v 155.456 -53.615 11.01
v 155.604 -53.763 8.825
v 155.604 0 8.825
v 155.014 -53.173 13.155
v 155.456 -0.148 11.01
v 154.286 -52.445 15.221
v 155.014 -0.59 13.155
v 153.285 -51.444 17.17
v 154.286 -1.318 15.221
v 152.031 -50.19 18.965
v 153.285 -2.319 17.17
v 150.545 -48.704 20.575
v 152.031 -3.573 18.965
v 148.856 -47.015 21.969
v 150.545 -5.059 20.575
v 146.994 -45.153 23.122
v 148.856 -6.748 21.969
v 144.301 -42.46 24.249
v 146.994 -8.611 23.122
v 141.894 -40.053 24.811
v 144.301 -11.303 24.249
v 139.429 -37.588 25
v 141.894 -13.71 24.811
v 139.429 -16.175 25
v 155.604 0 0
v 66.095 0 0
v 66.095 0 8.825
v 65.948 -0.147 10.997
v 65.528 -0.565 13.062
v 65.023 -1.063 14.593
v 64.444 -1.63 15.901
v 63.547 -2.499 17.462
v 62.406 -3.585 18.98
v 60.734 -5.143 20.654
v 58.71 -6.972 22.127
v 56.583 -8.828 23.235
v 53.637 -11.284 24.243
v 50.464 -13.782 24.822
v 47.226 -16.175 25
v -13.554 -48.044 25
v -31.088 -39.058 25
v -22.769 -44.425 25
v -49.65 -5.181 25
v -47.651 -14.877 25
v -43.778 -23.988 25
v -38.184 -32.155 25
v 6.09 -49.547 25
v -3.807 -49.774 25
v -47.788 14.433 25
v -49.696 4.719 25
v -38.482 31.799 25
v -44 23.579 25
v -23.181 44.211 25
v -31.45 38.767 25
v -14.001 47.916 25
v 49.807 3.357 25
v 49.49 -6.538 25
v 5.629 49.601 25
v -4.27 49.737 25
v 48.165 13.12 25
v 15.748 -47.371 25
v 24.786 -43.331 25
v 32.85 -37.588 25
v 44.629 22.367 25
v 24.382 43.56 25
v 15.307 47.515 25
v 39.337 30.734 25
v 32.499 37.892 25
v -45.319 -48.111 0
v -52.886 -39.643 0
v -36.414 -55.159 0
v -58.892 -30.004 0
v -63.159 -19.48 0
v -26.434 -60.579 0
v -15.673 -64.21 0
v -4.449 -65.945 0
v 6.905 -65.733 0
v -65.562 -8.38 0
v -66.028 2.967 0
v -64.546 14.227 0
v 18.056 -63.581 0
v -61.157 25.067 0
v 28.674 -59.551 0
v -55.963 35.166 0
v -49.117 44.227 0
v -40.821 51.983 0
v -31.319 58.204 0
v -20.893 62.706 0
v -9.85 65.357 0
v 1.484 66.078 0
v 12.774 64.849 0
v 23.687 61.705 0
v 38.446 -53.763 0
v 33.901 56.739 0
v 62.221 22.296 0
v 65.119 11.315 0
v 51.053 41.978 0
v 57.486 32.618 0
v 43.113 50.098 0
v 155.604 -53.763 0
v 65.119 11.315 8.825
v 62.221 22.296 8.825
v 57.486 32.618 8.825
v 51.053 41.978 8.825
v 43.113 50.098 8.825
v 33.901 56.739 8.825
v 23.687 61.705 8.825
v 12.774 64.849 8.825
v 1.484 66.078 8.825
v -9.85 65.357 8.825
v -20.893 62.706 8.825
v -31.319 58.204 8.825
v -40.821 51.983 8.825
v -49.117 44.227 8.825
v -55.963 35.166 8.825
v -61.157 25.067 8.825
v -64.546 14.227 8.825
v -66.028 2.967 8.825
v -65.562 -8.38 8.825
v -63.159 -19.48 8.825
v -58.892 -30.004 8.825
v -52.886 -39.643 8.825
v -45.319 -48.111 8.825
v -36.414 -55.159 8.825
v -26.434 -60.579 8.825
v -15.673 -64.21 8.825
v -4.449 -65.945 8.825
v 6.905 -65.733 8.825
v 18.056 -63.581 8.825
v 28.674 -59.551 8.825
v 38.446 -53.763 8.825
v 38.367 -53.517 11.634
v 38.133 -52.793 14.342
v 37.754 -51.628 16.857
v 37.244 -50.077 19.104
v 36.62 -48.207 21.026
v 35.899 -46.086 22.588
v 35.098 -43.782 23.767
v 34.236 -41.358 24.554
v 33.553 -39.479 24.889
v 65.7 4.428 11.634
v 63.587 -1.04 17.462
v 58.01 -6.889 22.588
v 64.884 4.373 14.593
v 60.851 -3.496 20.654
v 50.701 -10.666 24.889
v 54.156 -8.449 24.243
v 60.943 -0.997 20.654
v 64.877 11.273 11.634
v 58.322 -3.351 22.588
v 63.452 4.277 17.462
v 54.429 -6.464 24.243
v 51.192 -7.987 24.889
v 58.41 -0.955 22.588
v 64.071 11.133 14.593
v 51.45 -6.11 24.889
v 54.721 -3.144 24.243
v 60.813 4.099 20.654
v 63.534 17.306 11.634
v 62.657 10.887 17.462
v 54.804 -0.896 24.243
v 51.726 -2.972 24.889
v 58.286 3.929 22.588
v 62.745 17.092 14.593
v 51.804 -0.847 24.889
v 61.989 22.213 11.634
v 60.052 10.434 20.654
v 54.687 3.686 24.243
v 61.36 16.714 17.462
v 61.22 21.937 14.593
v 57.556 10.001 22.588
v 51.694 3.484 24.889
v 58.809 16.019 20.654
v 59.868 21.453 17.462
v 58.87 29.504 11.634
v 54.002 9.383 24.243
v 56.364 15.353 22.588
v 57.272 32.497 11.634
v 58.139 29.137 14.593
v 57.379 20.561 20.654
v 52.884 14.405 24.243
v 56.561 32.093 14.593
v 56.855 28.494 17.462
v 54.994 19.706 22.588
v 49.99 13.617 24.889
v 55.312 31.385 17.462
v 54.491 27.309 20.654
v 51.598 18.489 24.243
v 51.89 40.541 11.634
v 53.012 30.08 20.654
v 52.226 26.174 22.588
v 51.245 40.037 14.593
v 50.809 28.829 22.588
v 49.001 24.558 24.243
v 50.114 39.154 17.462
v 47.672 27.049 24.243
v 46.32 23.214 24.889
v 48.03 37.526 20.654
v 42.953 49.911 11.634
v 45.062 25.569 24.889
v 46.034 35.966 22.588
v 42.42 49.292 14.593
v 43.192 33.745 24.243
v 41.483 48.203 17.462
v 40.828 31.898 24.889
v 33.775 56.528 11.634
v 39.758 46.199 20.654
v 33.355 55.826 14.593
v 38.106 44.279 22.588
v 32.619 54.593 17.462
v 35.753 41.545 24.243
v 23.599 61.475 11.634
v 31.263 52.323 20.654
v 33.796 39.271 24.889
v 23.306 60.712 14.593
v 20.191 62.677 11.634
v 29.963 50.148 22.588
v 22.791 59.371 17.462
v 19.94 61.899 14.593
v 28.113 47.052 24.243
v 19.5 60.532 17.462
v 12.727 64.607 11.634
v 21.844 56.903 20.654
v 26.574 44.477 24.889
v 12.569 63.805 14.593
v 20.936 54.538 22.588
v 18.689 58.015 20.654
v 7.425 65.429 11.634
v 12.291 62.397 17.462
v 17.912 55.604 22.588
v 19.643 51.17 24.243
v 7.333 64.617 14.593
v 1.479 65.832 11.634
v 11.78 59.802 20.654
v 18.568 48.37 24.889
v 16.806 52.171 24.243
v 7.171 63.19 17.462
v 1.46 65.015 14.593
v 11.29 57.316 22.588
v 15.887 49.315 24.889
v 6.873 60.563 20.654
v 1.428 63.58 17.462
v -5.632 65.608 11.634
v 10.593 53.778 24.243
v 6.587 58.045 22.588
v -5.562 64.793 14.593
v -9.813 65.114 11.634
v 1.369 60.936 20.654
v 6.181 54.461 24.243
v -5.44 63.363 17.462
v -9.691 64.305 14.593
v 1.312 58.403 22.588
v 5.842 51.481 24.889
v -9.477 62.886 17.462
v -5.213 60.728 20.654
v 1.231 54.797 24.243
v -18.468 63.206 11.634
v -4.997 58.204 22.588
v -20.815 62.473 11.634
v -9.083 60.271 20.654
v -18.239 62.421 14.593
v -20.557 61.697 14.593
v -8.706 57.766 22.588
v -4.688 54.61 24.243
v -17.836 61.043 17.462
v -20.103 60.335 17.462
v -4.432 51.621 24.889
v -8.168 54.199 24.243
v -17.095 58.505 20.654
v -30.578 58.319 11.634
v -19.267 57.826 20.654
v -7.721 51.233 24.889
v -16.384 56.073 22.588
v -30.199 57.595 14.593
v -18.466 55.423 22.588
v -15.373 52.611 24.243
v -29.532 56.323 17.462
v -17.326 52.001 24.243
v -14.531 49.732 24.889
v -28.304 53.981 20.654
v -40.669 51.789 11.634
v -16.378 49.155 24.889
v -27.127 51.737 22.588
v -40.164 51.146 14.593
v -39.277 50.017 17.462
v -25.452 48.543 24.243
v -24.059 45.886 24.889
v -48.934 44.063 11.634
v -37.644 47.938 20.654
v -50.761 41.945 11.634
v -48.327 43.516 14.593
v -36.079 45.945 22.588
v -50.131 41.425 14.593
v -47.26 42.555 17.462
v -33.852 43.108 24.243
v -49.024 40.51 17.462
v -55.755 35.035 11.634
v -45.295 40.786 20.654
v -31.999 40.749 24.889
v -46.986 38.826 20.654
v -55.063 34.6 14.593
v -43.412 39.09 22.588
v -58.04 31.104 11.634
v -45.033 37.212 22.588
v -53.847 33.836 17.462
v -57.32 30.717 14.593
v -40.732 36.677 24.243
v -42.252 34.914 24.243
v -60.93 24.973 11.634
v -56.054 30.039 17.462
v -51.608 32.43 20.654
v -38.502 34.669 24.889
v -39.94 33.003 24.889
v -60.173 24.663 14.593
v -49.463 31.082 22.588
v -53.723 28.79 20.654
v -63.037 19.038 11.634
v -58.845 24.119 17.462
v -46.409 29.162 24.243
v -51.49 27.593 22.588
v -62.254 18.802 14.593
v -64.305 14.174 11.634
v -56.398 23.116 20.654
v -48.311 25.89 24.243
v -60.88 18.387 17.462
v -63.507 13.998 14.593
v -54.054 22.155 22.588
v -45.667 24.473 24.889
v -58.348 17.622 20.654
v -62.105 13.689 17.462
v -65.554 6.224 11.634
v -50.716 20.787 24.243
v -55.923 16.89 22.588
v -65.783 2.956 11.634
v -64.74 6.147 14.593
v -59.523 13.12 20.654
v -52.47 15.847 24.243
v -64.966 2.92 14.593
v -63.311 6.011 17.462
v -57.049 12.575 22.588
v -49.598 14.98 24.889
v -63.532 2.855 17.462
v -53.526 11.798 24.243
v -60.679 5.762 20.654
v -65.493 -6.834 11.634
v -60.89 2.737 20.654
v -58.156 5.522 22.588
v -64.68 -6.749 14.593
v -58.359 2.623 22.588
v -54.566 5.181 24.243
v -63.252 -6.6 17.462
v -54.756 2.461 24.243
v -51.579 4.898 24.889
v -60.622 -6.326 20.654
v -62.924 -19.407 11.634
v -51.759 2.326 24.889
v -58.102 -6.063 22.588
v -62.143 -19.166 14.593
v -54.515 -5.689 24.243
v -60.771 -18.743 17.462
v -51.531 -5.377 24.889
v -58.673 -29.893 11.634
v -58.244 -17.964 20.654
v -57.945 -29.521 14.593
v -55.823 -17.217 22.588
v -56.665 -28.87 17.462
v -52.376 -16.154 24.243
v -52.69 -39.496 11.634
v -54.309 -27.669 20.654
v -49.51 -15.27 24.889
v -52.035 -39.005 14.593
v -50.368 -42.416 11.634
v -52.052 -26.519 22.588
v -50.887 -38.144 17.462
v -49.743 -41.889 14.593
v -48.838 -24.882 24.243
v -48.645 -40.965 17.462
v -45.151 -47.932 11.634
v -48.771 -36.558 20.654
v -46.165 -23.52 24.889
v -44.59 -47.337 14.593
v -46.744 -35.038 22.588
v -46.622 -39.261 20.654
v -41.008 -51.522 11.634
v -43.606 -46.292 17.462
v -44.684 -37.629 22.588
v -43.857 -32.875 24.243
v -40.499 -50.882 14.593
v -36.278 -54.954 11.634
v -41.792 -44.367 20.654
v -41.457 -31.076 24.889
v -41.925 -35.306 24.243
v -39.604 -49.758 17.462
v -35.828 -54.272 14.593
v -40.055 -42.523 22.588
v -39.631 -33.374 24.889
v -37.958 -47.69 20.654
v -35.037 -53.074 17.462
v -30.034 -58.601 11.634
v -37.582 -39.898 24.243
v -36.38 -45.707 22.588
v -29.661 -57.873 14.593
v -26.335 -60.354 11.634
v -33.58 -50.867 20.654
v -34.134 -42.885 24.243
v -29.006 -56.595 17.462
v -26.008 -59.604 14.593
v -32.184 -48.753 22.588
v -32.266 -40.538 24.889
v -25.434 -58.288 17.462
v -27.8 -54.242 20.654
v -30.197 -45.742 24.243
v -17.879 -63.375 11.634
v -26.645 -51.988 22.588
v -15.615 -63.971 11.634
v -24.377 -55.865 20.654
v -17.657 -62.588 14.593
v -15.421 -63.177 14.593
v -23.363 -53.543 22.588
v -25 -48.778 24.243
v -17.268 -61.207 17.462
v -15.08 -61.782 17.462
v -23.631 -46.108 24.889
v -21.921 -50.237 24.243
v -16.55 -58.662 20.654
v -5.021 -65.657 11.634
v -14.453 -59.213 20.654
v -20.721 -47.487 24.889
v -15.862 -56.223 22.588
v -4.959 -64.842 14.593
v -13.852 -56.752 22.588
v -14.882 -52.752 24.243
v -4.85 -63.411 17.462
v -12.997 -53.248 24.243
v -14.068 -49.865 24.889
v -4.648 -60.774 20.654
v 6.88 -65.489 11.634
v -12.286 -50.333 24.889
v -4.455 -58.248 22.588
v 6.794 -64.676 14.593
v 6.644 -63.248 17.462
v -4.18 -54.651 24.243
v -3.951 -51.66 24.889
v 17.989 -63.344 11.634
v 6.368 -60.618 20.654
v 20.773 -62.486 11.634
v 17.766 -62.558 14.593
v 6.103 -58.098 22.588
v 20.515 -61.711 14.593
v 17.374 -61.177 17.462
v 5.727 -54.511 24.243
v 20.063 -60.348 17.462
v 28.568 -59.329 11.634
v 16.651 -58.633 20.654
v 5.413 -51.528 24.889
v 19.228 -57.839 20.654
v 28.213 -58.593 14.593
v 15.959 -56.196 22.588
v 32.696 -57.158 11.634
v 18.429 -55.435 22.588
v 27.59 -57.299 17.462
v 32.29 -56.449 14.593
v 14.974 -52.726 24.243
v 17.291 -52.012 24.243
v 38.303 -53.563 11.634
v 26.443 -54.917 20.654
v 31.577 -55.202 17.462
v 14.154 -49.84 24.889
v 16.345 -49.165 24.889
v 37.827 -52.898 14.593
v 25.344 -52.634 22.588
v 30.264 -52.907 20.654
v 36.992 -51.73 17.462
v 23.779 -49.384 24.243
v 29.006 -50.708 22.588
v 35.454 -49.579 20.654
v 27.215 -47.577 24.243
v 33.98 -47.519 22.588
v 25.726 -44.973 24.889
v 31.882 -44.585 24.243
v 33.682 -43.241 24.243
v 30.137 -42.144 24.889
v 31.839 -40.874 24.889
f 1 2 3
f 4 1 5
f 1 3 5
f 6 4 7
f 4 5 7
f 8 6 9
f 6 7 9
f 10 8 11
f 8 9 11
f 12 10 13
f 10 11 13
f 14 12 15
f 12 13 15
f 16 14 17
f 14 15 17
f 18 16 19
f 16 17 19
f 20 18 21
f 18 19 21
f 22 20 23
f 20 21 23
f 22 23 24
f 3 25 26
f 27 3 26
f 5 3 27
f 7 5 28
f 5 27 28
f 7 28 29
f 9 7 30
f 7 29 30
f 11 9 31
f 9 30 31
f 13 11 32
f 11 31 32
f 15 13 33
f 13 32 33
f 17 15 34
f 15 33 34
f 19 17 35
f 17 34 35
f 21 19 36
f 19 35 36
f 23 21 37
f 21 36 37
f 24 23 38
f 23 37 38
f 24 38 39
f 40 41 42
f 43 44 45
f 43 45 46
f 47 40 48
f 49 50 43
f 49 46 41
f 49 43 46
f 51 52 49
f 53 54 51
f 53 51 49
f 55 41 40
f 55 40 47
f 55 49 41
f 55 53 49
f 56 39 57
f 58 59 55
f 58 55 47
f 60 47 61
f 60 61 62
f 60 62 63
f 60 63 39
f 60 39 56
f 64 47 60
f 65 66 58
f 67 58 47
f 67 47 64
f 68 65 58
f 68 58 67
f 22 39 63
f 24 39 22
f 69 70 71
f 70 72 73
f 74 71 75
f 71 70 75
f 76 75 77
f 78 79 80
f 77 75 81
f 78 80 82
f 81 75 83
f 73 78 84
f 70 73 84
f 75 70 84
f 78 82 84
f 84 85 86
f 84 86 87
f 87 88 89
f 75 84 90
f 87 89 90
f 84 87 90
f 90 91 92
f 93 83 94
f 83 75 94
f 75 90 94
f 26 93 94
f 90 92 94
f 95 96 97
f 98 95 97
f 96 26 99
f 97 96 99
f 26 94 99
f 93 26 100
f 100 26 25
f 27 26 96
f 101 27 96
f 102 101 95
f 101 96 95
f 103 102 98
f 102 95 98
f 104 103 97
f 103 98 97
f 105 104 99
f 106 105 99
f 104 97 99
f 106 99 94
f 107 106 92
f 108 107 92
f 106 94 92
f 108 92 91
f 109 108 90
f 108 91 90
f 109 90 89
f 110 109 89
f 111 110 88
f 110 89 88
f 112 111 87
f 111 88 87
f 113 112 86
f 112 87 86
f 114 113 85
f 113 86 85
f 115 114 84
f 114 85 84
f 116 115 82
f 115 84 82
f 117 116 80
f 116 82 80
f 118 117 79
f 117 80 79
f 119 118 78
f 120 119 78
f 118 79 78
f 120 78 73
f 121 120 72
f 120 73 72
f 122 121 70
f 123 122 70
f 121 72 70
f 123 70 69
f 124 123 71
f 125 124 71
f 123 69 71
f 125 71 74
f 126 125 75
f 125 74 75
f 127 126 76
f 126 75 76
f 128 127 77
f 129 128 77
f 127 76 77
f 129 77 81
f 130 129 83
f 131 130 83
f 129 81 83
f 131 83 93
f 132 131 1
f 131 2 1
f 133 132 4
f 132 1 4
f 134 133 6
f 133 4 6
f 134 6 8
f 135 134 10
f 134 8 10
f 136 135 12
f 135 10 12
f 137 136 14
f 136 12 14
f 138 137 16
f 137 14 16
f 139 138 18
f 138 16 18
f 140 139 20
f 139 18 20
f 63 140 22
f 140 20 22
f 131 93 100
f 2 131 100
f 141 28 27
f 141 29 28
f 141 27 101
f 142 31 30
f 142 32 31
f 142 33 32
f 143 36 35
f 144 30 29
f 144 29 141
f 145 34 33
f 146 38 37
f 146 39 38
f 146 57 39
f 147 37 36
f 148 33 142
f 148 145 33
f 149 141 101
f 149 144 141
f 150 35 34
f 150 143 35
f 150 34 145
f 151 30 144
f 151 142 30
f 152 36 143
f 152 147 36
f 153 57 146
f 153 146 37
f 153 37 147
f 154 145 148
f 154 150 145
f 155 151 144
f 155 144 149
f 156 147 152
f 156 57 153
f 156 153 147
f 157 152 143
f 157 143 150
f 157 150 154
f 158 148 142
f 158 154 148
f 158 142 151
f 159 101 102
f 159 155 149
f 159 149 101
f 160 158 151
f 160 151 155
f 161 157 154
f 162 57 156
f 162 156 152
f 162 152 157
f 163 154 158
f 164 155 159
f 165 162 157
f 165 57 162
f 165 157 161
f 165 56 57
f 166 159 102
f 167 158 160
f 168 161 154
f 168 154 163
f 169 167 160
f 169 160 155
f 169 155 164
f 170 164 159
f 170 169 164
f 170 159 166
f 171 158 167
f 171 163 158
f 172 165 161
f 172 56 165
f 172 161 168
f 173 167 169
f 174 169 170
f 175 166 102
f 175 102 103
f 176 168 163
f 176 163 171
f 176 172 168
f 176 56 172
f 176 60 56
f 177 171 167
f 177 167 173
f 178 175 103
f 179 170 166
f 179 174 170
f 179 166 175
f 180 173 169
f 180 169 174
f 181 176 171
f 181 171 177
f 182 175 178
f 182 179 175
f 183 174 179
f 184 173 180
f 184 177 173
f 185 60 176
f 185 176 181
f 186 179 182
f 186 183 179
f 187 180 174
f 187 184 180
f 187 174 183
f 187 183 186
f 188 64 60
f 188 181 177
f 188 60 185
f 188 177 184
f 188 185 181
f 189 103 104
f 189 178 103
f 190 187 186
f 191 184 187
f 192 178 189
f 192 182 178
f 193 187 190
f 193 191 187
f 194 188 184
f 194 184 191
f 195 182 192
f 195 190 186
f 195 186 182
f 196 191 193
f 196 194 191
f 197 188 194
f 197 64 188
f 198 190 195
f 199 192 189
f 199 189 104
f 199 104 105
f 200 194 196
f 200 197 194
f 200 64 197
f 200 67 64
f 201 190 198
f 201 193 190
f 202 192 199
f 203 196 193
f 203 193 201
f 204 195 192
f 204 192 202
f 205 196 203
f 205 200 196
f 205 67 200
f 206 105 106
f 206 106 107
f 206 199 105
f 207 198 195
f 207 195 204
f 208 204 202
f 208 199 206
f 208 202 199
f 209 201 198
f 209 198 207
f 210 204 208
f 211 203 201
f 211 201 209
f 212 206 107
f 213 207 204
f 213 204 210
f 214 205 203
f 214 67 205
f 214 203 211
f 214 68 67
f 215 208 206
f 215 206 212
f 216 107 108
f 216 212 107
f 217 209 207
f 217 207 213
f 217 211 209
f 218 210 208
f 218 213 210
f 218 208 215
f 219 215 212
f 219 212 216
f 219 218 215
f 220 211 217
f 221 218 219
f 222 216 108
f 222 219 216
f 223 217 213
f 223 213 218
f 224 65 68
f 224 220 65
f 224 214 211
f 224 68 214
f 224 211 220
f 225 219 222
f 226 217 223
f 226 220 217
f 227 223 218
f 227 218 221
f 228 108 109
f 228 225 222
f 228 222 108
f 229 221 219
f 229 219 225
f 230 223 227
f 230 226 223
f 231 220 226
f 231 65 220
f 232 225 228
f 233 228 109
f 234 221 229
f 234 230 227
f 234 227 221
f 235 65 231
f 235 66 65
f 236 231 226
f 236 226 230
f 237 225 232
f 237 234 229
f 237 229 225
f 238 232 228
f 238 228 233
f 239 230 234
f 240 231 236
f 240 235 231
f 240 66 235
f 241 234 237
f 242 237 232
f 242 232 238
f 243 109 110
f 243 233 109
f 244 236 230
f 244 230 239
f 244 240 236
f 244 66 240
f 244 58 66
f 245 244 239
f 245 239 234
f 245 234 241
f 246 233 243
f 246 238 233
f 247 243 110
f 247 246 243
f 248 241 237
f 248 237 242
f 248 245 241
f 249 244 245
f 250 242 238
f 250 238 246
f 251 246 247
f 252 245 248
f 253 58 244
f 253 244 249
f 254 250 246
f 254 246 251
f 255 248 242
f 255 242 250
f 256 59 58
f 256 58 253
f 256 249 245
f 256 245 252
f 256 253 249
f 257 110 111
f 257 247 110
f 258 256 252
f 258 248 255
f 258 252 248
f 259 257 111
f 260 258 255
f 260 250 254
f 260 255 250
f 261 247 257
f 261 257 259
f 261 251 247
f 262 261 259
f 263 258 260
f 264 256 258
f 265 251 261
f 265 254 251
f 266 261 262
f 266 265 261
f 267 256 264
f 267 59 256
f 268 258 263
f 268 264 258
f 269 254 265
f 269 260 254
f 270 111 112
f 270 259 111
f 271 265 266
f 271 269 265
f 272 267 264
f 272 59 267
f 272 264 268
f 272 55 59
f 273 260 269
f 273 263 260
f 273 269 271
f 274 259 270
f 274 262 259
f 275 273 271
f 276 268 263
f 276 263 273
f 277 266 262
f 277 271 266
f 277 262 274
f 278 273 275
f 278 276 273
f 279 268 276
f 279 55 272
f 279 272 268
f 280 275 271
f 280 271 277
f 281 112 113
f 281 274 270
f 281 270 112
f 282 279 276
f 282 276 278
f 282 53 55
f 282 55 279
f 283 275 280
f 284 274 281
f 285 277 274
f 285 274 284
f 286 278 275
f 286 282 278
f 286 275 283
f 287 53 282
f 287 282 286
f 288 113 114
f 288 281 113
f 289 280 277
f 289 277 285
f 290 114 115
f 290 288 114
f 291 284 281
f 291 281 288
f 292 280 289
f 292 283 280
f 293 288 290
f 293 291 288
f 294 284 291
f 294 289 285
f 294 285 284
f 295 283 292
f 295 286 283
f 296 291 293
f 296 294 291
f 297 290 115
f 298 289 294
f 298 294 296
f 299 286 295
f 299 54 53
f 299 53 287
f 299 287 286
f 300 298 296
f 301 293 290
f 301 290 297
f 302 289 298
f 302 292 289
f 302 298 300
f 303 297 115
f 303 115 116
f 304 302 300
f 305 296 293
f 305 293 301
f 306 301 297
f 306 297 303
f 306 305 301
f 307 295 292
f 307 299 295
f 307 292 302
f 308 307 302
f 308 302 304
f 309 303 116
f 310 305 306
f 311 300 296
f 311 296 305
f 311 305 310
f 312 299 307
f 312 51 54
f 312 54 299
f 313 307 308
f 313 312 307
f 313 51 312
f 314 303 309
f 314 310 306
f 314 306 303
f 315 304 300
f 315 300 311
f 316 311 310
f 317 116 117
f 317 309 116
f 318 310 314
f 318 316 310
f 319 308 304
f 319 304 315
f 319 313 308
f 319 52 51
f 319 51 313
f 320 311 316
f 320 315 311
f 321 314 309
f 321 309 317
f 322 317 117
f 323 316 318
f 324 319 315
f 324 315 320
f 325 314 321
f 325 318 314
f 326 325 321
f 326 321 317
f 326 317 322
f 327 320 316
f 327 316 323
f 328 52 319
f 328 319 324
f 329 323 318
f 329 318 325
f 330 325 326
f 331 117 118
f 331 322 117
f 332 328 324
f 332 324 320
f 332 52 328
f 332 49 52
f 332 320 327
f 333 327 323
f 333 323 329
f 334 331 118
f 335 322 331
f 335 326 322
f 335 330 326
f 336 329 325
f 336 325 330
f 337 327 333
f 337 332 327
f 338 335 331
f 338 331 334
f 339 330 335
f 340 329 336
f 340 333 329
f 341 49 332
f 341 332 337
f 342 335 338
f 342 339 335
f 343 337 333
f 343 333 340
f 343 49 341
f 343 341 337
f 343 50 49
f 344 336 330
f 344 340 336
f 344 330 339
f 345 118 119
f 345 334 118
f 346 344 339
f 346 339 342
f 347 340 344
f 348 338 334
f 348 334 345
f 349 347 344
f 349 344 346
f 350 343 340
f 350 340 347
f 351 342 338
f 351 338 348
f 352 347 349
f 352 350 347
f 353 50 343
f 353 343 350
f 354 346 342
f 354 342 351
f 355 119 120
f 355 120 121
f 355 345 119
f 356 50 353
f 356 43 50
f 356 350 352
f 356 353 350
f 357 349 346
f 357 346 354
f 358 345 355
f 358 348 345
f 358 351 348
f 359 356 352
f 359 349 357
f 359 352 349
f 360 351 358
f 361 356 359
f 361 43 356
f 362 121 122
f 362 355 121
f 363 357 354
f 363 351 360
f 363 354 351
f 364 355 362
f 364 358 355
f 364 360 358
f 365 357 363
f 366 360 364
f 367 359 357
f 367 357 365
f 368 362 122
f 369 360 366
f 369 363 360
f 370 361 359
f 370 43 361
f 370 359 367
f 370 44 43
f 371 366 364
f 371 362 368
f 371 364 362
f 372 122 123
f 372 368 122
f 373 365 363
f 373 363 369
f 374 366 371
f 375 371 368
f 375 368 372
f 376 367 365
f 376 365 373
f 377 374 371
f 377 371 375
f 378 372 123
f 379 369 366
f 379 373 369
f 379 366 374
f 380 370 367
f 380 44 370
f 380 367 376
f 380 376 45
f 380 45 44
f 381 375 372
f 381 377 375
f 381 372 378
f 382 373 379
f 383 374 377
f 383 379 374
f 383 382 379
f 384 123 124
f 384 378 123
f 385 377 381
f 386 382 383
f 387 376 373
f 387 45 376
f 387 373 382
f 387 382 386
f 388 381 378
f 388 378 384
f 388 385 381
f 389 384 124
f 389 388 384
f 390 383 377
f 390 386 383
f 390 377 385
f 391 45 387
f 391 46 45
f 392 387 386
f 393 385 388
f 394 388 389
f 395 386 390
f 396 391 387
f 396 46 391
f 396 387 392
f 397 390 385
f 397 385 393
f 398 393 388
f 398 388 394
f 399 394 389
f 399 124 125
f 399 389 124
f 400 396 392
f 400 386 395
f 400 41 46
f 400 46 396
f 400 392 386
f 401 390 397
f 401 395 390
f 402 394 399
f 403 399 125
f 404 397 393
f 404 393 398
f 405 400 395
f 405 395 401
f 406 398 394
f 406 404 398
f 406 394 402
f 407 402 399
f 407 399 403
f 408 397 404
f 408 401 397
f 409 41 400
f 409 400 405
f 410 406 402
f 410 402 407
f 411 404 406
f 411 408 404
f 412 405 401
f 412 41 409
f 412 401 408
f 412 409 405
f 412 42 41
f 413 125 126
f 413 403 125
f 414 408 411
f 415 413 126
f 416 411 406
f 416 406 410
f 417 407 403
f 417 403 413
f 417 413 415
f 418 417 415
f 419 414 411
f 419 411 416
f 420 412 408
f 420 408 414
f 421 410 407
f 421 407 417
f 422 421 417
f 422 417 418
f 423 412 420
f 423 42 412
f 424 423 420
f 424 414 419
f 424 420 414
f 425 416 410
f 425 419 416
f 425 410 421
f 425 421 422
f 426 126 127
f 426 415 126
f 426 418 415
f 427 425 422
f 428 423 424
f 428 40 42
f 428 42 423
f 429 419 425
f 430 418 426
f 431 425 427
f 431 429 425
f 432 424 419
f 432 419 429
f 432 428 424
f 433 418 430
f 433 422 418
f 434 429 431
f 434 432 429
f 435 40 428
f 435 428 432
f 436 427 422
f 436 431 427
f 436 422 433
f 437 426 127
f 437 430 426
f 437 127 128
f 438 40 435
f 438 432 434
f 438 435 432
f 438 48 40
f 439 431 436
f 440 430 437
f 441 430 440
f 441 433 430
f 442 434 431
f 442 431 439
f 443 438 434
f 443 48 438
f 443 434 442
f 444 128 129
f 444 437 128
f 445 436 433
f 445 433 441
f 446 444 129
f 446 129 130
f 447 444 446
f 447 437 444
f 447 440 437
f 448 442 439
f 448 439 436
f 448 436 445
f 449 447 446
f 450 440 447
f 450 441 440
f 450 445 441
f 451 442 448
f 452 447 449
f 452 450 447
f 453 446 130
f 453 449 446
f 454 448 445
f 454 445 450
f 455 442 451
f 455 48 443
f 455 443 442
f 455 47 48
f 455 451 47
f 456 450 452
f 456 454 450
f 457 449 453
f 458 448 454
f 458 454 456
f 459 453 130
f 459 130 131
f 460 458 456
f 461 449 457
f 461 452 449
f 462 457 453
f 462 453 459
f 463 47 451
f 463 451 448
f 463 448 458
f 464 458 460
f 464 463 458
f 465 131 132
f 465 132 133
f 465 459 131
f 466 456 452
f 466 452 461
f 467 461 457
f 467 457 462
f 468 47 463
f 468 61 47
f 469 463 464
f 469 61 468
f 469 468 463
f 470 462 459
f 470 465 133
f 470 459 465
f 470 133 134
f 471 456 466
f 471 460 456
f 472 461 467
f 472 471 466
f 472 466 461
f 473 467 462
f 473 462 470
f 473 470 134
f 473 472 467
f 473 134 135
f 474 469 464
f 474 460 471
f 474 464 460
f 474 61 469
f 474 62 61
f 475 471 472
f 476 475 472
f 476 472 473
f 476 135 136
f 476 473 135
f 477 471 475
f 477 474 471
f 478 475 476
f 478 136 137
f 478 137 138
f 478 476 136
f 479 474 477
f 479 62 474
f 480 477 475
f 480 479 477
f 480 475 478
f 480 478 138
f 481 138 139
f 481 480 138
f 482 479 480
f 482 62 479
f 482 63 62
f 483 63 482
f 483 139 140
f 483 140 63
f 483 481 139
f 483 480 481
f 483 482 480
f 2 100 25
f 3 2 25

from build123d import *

# Parameters (mm, degrees)
F1_DEPTH = 25
F2_R     = 16.1752308679


with BuildPart() as f1:
    # F0 (on Top) → F1 (new body)
    with BuildSketch(Plane.XY):
        with BuildLine():
            Line((155.6041836739, 0), (66.094889761, 0))
            ThreePointArc((66.094889761, 0), (58.777489451, -30.2281522154), (38.4455150616, -53.7631548941))
            Line((38.4455150616, -53.7631548941), (155.6041836739, -53.7631548941))
            Line((155.6041836739, -53.7631548941), (155.6041836739, 0))
        make_face()
        with BuildLine():
            ThreePointArc((38.4455150616, -53.7631548941), (58.777489451, -30.2281522154), (66.094889761, 0))
            Line((66.094889761, 0), (0, 0))
            Line((0, 0), (0, -53.7631548941))
            Line((0, -53.7631548941), (38.4455150616, -53.7631548941))
        make_face()
        with BuildLine():
            Line((0, 0), (66.094889761, 0))
            ThreePointArc((66.094889761, 0), (-58.777489451, 30.2281522154), (38.4455150616, -53.7631548941))
            Line((38.4455150616, -53.7631548941), (0, -53.7631548941))
            Line((0, -53.7631548941), (0, 0))
        make_face()
    extrude(amount=F1_DEPTH)

    # F2
    f2_edges = [f1.edges().sort_by_distance(p)[0] for p in [
        (-58.777489, 30.228152, 25),
        (155.604184, -26.881577, 25),
        (110.849537, 0, 25),
        (97.024849, -53.763155, 25),
    ]]
    fillet(f2_edges, radius=F2_R)


solid = f1.part
